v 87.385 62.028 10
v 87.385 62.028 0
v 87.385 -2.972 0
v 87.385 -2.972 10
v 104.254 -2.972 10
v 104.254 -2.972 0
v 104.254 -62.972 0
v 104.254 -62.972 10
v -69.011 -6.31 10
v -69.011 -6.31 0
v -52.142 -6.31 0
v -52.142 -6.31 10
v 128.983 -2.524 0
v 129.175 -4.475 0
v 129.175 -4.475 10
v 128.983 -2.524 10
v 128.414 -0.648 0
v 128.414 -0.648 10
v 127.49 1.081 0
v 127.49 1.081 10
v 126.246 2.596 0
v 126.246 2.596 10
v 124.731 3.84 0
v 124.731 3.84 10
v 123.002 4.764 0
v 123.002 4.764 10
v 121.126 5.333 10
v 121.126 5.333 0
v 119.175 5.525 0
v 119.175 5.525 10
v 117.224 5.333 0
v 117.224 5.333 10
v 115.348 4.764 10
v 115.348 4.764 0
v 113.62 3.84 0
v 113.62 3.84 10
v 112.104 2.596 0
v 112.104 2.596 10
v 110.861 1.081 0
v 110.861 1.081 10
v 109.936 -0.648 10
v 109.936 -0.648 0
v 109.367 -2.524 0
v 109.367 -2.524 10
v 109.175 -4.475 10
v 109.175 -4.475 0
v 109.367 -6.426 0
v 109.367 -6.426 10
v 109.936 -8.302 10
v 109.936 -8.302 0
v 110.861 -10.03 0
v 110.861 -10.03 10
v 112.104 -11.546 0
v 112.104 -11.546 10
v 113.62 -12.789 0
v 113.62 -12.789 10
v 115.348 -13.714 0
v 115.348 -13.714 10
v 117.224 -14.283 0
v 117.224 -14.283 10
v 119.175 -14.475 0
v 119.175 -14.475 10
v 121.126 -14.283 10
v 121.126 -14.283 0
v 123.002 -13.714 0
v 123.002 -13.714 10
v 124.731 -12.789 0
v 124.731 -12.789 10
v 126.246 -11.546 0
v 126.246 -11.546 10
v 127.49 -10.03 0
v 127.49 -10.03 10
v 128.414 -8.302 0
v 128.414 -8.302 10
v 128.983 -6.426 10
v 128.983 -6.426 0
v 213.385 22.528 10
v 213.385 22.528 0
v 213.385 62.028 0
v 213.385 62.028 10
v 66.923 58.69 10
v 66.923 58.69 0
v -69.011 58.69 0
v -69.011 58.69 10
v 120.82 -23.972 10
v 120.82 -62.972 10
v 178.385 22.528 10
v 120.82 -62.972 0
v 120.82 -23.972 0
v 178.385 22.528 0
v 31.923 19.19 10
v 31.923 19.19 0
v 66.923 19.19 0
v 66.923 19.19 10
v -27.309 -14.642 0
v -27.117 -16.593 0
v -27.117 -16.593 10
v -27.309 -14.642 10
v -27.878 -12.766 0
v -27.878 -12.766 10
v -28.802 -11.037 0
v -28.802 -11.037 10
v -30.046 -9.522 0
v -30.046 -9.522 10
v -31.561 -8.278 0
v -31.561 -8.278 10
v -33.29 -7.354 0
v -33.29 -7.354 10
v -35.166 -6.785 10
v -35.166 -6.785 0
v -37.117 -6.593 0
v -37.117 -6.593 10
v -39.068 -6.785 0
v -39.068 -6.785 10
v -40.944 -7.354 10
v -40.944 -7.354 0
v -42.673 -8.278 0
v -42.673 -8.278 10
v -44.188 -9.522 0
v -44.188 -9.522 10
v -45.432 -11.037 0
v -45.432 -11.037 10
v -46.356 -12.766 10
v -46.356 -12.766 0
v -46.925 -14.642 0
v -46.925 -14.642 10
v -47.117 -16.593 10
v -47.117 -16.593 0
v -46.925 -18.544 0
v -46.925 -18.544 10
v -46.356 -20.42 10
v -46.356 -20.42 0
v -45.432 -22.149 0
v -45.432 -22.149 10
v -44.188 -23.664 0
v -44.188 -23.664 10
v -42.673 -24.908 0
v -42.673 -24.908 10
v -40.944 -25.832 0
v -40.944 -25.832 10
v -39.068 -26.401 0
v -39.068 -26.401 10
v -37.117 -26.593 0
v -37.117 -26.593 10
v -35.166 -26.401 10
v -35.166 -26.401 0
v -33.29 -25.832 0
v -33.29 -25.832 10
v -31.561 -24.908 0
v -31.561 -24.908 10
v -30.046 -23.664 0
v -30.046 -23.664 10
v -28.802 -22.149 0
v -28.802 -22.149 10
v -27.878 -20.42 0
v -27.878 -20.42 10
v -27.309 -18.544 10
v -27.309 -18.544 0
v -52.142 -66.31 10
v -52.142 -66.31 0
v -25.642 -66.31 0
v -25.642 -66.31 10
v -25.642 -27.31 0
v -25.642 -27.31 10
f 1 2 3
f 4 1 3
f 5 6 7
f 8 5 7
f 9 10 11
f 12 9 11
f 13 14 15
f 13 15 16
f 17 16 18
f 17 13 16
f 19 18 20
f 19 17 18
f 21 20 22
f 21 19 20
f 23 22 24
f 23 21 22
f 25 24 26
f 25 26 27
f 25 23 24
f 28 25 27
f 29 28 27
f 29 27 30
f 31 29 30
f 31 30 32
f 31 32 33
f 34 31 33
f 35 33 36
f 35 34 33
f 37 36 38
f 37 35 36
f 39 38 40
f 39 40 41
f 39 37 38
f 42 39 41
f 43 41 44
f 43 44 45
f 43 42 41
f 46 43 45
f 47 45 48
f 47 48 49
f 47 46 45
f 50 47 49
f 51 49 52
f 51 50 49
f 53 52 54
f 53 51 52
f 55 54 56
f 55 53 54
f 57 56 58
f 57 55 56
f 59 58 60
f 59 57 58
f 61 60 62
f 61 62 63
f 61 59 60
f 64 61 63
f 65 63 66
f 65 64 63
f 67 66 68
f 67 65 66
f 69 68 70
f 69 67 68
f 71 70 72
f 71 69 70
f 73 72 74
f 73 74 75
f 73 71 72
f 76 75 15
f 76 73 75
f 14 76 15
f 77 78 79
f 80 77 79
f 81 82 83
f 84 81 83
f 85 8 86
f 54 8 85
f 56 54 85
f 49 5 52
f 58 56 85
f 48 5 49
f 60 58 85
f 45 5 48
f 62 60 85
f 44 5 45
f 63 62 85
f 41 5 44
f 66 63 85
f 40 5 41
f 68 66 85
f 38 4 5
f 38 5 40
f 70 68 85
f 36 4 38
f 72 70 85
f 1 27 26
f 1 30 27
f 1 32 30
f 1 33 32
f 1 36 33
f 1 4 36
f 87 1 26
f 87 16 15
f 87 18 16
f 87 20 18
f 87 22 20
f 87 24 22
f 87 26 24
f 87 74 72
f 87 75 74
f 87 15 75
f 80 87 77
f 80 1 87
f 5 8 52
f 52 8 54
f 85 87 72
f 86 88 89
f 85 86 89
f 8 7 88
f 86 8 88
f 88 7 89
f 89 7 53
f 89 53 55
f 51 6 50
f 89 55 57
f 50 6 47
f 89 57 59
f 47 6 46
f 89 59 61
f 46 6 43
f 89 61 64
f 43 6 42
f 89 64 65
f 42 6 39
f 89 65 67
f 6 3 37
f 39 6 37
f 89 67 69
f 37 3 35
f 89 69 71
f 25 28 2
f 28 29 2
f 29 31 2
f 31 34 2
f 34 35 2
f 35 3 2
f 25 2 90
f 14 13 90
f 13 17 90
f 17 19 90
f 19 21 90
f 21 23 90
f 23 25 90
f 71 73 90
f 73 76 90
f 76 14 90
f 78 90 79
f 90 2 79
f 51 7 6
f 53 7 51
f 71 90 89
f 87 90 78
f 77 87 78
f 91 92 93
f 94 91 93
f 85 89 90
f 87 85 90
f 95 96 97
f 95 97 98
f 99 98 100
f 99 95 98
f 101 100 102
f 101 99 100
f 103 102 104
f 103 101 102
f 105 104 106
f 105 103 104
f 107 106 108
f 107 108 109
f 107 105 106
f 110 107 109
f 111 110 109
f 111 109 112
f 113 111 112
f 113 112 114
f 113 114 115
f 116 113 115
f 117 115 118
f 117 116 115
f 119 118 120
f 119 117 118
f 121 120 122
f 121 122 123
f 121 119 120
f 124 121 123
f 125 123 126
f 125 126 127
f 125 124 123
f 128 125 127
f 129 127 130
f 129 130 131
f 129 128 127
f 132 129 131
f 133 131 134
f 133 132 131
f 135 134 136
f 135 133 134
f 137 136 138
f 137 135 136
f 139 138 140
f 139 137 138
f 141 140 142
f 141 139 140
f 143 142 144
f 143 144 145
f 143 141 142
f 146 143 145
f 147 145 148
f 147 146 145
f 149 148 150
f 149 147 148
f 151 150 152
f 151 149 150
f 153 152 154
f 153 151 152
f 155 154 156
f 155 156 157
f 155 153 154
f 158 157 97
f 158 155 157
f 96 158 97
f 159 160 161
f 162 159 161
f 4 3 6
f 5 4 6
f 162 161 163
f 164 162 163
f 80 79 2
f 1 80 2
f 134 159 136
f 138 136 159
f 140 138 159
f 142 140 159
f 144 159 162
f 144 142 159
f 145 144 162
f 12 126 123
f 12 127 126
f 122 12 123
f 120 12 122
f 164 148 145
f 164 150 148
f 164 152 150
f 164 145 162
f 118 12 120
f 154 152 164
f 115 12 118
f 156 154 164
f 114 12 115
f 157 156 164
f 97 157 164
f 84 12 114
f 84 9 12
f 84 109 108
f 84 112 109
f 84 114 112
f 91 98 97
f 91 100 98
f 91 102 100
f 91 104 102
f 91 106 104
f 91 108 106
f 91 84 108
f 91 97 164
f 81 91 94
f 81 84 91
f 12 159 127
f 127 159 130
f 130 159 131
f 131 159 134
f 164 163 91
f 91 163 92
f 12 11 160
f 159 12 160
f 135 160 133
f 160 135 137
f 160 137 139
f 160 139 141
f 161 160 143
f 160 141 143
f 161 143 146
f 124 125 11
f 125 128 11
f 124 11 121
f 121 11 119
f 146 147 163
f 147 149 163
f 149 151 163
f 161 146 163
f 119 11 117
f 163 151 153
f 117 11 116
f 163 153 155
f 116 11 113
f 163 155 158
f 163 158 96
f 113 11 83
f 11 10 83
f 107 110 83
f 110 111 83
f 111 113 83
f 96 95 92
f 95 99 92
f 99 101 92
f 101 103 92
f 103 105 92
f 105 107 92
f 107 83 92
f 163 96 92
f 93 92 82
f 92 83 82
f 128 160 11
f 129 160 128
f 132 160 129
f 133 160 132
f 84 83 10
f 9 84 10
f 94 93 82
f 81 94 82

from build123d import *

# Parameters (mm, degrees)
F0_R     = 10
F2_DEPTH = 10
F1_R     = 10
F3_DEPTH = 10


with BuildPart() as f2:
    # F0 (on Top) → F2 (new body)
    with BuildSketch(Plane.XY):
        Polygon((66.923017, 58.689907), (-69.011015, 58.689907), (-69.011015, -6.310093), (-52.142164, -6.310093), (-52.142164, -66.310093), (-25.642164, -66.310093), (-25.642164, -27.310093), (31.923017, 19.189907), (66.923017, 19.189907), align=None)
        with Locations((-37.117013, -16.593009)):
            Circle(F0_R, mode=Mode.SUBTRACT)
    extrude(amount=F2_DEPTH)


with BuildPart() as f3:
    # F1 (on Top) → F3 (new body)
    with BuildSketch(Plane.XY):
        Polygon((213.384705, 62.028292), (87.384705, 62.028292), (87.384705, -2.971708), (104.253556, -2.971708), (104.253556, -62.971708), (120.819525, -62.971708), (120.819525, -23.971708), (178.384705, 22.528292), (213.384705, 22.528292), align=None)
        with Locations((119.175255, -4.474771)):
            Circle(F1_R, mode=Mode.SUBTRACT)
    extrude(amount=F3_DEPTH)


solid = Compound([f2.part, f3.part])
